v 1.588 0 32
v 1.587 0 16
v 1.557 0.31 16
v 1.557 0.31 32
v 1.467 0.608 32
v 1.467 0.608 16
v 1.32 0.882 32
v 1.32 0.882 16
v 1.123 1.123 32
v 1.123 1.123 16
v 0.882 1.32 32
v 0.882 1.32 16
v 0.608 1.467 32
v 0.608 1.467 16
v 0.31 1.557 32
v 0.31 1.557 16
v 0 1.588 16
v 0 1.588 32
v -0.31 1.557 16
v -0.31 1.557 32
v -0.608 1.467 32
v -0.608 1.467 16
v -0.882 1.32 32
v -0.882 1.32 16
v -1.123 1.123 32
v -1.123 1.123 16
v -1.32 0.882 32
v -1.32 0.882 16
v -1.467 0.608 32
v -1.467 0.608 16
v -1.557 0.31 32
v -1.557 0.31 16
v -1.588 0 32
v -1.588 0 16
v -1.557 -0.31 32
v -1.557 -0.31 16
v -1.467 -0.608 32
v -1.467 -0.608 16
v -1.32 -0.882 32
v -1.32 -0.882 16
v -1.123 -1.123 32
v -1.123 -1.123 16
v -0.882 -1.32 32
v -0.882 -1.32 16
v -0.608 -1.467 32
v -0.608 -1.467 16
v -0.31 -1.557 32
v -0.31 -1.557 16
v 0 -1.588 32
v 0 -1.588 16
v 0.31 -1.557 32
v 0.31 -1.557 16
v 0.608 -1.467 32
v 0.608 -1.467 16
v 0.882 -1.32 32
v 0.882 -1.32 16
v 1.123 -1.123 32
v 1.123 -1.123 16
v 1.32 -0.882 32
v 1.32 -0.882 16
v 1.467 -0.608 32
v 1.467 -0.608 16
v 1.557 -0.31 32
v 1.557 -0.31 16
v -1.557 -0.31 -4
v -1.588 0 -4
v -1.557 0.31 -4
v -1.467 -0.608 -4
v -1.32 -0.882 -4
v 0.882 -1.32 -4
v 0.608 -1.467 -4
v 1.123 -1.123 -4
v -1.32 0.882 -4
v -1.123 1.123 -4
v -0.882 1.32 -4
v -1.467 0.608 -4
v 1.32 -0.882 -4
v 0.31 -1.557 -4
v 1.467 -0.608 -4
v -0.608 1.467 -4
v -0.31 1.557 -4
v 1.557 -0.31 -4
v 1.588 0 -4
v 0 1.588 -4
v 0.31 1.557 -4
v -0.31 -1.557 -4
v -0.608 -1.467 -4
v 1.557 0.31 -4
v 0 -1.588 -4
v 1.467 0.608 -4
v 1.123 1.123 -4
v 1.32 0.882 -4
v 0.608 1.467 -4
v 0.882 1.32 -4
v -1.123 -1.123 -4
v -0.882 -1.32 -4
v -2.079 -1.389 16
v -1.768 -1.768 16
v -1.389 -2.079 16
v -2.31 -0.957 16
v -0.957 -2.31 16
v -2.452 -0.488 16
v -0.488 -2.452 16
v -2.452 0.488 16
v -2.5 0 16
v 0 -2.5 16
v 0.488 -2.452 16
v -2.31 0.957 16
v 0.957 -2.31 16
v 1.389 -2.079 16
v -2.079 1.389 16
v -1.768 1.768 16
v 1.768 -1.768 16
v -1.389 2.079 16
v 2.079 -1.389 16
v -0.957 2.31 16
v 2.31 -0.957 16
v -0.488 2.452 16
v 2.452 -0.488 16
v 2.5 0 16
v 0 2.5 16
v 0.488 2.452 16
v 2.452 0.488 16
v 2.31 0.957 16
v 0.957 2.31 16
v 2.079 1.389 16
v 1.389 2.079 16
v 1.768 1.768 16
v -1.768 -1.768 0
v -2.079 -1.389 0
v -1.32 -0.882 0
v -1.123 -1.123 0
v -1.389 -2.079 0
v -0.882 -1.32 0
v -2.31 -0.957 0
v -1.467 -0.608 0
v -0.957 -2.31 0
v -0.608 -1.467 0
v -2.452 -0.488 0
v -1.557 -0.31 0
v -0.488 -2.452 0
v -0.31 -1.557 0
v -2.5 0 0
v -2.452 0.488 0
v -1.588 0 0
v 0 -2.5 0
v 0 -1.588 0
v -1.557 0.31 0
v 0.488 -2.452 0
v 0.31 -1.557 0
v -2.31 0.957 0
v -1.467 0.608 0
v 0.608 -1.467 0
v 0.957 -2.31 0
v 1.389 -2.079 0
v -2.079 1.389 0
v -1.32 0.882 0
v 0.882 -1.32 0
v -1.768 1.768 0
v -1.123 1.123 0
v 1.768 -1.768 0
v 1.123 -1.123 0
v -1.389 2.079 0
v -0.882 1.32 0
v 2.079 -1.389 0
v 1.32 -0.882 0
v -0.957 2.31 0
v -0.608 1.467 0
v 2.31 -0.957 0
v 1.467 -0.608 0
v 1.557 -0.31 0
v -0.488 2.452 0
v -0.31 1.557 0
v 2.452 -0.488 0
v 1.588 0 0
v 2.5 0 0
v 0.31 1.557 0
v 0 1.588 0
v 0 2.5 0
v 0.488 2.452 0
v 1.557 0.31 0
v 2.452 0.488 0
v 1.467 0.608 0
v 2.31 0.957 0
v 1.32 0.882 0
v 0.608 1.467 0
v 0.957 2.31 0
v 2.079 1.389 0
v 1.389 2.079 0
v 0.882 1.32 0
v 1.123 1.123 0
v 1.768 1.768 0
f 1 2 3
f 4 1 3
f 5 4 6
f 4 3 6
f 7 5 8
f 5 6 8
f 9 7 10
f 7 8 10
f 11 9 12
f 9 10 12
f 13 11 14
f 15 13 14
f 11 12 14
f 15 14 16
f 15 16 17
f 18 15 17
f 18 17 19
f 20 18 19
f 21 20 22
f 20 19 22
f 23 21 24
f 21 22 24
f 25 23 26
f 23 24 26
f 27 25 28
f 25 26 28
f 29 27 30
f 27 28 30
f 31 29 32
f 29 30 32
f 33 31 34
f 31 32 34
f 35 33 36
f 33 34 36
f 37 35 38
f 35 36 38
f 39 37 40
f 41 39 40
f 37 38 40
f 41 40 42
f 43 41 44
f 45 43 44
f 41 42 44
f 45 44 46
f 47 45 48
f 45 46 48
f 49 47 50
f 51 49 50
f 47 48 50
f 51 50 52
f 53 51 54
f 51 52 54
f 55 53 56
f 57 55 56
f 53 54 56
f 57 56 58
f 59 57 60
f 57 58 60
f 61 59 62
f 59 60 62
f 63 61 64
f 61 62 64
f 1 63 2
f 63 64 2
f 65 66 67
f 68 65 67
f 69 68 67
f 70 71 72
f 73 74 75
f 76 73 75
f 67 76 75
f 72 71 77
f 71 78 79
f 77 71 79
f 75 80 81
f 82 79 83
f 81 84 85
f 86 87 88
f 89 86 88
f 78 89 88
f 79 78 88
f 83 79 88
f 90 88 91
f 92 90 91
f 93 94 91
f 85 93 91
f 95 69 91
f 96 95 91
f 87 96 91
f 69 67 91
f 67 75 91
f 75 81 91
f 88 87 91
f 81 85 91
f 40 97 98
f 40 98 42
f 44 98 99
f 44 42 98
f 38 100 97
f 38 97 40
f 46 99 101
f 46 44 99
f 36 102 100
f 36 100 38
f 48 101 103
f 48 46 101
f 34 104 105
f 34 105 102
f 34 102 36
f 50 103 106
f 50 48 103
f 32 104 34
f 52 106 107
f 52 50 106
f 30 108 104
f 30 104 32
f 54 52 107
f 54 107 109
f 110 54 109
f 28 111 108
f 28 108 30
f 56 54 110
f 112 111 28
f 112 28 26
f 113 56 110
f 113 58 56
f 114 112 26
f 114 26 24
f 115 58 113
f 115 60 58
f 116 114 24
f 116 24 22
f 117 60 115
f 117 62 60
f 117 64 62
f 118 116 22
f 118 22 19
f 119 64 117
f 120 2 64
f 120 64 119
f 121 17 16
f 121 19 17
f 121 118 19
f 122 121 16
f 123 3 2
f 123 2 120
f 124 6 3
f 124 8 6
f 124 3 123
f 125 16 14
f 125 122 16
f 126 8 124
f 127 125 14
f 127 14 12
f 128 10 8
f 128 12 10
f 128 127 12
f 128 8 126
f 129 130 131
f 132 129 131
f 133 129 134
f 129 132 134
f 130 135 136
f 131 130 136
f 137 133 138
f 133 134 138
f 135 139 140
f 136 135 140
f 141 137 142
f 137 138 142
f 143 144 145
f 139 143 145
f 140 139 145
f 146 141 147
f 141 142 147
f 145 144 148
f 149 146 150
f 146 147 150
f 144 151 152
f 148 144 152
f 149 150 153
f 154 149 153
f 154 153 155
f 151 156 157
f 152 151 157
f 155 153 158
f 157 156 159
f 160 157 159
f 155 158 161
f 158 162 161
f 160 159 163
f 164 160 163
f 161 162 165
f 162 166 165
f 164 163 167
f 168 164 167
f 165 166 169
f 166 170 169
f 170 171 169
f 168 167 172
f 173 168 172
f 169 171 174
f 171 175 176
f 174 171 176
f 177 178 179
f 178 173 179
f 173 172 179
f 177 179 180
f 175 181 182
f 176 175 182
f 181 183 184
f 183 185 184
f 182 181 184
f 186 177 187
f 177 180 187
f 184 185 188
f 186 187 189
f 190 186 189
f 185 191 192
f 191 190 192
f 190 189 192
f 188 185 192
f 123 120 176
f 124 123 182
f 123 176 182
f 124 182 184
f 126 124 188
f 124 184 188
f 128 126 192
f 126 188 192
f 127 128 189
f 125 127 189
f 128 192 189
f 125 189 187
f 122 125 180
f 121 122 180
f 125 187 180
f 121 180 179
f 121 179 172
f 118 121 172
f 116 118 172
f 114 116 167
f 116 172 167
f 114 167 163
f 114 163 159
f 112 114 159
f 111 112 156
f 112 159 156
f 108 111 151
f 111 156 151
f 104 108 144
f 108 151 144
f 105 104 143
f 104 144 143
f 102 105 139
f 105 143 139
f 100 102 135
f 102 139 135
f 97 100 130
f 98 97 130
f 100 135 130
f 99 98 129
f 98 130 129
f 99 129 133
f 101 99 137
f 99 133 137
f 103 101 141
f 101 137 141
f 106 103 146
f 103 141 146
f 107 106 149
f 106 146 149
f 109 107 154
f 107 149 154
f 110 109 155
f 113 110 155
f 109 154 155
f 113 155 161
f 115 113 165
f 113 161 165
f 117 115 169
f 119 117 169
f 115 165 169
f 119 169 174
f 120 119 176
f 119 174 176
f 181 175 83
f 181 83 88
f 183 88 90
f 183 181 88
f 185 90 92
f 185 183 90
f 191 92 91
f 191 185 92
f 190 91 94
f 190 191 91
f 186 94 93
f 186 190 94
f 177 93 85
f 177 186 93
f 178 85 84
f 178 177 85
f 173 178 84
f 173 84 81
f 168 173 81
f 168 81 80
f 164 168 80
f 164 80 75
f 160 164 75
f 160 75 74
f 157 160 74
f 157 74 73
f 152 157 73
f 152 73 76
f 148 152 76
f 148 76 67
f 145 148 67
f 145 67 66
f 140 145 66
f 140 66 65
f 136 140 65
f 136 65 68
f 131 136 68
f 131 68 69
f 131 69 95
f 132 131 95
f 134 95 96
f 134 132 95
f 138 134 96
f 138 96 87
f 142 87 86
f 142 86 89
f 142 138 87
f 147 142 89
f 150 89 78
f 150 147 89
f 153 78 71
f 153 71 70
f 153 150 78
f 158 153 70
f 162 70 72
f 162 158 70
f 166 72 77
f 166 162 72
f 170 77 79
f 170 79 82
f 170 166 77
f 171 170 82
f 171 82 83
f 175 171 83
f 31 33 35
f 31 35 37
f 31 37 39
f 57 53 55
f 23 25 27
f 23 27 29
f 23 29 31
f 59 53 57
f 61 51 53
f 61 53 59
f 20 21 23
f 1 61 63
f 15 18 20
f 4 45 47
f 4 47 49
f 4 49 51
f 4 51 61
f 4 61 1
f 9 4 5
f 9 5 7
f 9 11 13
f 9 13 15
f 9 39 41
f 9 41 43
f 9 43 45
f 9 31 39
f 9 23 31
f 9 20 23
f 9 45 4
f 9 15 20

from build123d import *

# Parameters (mm, degrees)
SKETCH1_R                = 2.5
BOSS_EXTRUDE1_DEPTH      = 16
SKETCH2_R                = 1.5875
BOSS_EXTRUDE2_DEPTH      = 16
BOSS_EXTRUDE2_DEPTH_BACK = 20


with BuildPart() as part:
    # Sketch1 → Boss-Extrude1 (new body)
    with BuildSketch(Plane.XY):
        Circle(SKETCH1_R)
    extrude(amount=BOSS_EXTRUDE1_DEPTH)

    # Sketch2 → Boss-Extrude2 (add, two sides)
    with BuildSketch(Plane.XY.offset(16)) as boss_extrude2_sk:
        Circle(SKETCH2_R)
    extrude(amount=BOSS_EXTRUDE2_DEPTH)
    extrude(boss_extrude2_sk.sketch, amount=-BOSS_EXTRUDE2_DEPTH_BACK)


solid = part.part
